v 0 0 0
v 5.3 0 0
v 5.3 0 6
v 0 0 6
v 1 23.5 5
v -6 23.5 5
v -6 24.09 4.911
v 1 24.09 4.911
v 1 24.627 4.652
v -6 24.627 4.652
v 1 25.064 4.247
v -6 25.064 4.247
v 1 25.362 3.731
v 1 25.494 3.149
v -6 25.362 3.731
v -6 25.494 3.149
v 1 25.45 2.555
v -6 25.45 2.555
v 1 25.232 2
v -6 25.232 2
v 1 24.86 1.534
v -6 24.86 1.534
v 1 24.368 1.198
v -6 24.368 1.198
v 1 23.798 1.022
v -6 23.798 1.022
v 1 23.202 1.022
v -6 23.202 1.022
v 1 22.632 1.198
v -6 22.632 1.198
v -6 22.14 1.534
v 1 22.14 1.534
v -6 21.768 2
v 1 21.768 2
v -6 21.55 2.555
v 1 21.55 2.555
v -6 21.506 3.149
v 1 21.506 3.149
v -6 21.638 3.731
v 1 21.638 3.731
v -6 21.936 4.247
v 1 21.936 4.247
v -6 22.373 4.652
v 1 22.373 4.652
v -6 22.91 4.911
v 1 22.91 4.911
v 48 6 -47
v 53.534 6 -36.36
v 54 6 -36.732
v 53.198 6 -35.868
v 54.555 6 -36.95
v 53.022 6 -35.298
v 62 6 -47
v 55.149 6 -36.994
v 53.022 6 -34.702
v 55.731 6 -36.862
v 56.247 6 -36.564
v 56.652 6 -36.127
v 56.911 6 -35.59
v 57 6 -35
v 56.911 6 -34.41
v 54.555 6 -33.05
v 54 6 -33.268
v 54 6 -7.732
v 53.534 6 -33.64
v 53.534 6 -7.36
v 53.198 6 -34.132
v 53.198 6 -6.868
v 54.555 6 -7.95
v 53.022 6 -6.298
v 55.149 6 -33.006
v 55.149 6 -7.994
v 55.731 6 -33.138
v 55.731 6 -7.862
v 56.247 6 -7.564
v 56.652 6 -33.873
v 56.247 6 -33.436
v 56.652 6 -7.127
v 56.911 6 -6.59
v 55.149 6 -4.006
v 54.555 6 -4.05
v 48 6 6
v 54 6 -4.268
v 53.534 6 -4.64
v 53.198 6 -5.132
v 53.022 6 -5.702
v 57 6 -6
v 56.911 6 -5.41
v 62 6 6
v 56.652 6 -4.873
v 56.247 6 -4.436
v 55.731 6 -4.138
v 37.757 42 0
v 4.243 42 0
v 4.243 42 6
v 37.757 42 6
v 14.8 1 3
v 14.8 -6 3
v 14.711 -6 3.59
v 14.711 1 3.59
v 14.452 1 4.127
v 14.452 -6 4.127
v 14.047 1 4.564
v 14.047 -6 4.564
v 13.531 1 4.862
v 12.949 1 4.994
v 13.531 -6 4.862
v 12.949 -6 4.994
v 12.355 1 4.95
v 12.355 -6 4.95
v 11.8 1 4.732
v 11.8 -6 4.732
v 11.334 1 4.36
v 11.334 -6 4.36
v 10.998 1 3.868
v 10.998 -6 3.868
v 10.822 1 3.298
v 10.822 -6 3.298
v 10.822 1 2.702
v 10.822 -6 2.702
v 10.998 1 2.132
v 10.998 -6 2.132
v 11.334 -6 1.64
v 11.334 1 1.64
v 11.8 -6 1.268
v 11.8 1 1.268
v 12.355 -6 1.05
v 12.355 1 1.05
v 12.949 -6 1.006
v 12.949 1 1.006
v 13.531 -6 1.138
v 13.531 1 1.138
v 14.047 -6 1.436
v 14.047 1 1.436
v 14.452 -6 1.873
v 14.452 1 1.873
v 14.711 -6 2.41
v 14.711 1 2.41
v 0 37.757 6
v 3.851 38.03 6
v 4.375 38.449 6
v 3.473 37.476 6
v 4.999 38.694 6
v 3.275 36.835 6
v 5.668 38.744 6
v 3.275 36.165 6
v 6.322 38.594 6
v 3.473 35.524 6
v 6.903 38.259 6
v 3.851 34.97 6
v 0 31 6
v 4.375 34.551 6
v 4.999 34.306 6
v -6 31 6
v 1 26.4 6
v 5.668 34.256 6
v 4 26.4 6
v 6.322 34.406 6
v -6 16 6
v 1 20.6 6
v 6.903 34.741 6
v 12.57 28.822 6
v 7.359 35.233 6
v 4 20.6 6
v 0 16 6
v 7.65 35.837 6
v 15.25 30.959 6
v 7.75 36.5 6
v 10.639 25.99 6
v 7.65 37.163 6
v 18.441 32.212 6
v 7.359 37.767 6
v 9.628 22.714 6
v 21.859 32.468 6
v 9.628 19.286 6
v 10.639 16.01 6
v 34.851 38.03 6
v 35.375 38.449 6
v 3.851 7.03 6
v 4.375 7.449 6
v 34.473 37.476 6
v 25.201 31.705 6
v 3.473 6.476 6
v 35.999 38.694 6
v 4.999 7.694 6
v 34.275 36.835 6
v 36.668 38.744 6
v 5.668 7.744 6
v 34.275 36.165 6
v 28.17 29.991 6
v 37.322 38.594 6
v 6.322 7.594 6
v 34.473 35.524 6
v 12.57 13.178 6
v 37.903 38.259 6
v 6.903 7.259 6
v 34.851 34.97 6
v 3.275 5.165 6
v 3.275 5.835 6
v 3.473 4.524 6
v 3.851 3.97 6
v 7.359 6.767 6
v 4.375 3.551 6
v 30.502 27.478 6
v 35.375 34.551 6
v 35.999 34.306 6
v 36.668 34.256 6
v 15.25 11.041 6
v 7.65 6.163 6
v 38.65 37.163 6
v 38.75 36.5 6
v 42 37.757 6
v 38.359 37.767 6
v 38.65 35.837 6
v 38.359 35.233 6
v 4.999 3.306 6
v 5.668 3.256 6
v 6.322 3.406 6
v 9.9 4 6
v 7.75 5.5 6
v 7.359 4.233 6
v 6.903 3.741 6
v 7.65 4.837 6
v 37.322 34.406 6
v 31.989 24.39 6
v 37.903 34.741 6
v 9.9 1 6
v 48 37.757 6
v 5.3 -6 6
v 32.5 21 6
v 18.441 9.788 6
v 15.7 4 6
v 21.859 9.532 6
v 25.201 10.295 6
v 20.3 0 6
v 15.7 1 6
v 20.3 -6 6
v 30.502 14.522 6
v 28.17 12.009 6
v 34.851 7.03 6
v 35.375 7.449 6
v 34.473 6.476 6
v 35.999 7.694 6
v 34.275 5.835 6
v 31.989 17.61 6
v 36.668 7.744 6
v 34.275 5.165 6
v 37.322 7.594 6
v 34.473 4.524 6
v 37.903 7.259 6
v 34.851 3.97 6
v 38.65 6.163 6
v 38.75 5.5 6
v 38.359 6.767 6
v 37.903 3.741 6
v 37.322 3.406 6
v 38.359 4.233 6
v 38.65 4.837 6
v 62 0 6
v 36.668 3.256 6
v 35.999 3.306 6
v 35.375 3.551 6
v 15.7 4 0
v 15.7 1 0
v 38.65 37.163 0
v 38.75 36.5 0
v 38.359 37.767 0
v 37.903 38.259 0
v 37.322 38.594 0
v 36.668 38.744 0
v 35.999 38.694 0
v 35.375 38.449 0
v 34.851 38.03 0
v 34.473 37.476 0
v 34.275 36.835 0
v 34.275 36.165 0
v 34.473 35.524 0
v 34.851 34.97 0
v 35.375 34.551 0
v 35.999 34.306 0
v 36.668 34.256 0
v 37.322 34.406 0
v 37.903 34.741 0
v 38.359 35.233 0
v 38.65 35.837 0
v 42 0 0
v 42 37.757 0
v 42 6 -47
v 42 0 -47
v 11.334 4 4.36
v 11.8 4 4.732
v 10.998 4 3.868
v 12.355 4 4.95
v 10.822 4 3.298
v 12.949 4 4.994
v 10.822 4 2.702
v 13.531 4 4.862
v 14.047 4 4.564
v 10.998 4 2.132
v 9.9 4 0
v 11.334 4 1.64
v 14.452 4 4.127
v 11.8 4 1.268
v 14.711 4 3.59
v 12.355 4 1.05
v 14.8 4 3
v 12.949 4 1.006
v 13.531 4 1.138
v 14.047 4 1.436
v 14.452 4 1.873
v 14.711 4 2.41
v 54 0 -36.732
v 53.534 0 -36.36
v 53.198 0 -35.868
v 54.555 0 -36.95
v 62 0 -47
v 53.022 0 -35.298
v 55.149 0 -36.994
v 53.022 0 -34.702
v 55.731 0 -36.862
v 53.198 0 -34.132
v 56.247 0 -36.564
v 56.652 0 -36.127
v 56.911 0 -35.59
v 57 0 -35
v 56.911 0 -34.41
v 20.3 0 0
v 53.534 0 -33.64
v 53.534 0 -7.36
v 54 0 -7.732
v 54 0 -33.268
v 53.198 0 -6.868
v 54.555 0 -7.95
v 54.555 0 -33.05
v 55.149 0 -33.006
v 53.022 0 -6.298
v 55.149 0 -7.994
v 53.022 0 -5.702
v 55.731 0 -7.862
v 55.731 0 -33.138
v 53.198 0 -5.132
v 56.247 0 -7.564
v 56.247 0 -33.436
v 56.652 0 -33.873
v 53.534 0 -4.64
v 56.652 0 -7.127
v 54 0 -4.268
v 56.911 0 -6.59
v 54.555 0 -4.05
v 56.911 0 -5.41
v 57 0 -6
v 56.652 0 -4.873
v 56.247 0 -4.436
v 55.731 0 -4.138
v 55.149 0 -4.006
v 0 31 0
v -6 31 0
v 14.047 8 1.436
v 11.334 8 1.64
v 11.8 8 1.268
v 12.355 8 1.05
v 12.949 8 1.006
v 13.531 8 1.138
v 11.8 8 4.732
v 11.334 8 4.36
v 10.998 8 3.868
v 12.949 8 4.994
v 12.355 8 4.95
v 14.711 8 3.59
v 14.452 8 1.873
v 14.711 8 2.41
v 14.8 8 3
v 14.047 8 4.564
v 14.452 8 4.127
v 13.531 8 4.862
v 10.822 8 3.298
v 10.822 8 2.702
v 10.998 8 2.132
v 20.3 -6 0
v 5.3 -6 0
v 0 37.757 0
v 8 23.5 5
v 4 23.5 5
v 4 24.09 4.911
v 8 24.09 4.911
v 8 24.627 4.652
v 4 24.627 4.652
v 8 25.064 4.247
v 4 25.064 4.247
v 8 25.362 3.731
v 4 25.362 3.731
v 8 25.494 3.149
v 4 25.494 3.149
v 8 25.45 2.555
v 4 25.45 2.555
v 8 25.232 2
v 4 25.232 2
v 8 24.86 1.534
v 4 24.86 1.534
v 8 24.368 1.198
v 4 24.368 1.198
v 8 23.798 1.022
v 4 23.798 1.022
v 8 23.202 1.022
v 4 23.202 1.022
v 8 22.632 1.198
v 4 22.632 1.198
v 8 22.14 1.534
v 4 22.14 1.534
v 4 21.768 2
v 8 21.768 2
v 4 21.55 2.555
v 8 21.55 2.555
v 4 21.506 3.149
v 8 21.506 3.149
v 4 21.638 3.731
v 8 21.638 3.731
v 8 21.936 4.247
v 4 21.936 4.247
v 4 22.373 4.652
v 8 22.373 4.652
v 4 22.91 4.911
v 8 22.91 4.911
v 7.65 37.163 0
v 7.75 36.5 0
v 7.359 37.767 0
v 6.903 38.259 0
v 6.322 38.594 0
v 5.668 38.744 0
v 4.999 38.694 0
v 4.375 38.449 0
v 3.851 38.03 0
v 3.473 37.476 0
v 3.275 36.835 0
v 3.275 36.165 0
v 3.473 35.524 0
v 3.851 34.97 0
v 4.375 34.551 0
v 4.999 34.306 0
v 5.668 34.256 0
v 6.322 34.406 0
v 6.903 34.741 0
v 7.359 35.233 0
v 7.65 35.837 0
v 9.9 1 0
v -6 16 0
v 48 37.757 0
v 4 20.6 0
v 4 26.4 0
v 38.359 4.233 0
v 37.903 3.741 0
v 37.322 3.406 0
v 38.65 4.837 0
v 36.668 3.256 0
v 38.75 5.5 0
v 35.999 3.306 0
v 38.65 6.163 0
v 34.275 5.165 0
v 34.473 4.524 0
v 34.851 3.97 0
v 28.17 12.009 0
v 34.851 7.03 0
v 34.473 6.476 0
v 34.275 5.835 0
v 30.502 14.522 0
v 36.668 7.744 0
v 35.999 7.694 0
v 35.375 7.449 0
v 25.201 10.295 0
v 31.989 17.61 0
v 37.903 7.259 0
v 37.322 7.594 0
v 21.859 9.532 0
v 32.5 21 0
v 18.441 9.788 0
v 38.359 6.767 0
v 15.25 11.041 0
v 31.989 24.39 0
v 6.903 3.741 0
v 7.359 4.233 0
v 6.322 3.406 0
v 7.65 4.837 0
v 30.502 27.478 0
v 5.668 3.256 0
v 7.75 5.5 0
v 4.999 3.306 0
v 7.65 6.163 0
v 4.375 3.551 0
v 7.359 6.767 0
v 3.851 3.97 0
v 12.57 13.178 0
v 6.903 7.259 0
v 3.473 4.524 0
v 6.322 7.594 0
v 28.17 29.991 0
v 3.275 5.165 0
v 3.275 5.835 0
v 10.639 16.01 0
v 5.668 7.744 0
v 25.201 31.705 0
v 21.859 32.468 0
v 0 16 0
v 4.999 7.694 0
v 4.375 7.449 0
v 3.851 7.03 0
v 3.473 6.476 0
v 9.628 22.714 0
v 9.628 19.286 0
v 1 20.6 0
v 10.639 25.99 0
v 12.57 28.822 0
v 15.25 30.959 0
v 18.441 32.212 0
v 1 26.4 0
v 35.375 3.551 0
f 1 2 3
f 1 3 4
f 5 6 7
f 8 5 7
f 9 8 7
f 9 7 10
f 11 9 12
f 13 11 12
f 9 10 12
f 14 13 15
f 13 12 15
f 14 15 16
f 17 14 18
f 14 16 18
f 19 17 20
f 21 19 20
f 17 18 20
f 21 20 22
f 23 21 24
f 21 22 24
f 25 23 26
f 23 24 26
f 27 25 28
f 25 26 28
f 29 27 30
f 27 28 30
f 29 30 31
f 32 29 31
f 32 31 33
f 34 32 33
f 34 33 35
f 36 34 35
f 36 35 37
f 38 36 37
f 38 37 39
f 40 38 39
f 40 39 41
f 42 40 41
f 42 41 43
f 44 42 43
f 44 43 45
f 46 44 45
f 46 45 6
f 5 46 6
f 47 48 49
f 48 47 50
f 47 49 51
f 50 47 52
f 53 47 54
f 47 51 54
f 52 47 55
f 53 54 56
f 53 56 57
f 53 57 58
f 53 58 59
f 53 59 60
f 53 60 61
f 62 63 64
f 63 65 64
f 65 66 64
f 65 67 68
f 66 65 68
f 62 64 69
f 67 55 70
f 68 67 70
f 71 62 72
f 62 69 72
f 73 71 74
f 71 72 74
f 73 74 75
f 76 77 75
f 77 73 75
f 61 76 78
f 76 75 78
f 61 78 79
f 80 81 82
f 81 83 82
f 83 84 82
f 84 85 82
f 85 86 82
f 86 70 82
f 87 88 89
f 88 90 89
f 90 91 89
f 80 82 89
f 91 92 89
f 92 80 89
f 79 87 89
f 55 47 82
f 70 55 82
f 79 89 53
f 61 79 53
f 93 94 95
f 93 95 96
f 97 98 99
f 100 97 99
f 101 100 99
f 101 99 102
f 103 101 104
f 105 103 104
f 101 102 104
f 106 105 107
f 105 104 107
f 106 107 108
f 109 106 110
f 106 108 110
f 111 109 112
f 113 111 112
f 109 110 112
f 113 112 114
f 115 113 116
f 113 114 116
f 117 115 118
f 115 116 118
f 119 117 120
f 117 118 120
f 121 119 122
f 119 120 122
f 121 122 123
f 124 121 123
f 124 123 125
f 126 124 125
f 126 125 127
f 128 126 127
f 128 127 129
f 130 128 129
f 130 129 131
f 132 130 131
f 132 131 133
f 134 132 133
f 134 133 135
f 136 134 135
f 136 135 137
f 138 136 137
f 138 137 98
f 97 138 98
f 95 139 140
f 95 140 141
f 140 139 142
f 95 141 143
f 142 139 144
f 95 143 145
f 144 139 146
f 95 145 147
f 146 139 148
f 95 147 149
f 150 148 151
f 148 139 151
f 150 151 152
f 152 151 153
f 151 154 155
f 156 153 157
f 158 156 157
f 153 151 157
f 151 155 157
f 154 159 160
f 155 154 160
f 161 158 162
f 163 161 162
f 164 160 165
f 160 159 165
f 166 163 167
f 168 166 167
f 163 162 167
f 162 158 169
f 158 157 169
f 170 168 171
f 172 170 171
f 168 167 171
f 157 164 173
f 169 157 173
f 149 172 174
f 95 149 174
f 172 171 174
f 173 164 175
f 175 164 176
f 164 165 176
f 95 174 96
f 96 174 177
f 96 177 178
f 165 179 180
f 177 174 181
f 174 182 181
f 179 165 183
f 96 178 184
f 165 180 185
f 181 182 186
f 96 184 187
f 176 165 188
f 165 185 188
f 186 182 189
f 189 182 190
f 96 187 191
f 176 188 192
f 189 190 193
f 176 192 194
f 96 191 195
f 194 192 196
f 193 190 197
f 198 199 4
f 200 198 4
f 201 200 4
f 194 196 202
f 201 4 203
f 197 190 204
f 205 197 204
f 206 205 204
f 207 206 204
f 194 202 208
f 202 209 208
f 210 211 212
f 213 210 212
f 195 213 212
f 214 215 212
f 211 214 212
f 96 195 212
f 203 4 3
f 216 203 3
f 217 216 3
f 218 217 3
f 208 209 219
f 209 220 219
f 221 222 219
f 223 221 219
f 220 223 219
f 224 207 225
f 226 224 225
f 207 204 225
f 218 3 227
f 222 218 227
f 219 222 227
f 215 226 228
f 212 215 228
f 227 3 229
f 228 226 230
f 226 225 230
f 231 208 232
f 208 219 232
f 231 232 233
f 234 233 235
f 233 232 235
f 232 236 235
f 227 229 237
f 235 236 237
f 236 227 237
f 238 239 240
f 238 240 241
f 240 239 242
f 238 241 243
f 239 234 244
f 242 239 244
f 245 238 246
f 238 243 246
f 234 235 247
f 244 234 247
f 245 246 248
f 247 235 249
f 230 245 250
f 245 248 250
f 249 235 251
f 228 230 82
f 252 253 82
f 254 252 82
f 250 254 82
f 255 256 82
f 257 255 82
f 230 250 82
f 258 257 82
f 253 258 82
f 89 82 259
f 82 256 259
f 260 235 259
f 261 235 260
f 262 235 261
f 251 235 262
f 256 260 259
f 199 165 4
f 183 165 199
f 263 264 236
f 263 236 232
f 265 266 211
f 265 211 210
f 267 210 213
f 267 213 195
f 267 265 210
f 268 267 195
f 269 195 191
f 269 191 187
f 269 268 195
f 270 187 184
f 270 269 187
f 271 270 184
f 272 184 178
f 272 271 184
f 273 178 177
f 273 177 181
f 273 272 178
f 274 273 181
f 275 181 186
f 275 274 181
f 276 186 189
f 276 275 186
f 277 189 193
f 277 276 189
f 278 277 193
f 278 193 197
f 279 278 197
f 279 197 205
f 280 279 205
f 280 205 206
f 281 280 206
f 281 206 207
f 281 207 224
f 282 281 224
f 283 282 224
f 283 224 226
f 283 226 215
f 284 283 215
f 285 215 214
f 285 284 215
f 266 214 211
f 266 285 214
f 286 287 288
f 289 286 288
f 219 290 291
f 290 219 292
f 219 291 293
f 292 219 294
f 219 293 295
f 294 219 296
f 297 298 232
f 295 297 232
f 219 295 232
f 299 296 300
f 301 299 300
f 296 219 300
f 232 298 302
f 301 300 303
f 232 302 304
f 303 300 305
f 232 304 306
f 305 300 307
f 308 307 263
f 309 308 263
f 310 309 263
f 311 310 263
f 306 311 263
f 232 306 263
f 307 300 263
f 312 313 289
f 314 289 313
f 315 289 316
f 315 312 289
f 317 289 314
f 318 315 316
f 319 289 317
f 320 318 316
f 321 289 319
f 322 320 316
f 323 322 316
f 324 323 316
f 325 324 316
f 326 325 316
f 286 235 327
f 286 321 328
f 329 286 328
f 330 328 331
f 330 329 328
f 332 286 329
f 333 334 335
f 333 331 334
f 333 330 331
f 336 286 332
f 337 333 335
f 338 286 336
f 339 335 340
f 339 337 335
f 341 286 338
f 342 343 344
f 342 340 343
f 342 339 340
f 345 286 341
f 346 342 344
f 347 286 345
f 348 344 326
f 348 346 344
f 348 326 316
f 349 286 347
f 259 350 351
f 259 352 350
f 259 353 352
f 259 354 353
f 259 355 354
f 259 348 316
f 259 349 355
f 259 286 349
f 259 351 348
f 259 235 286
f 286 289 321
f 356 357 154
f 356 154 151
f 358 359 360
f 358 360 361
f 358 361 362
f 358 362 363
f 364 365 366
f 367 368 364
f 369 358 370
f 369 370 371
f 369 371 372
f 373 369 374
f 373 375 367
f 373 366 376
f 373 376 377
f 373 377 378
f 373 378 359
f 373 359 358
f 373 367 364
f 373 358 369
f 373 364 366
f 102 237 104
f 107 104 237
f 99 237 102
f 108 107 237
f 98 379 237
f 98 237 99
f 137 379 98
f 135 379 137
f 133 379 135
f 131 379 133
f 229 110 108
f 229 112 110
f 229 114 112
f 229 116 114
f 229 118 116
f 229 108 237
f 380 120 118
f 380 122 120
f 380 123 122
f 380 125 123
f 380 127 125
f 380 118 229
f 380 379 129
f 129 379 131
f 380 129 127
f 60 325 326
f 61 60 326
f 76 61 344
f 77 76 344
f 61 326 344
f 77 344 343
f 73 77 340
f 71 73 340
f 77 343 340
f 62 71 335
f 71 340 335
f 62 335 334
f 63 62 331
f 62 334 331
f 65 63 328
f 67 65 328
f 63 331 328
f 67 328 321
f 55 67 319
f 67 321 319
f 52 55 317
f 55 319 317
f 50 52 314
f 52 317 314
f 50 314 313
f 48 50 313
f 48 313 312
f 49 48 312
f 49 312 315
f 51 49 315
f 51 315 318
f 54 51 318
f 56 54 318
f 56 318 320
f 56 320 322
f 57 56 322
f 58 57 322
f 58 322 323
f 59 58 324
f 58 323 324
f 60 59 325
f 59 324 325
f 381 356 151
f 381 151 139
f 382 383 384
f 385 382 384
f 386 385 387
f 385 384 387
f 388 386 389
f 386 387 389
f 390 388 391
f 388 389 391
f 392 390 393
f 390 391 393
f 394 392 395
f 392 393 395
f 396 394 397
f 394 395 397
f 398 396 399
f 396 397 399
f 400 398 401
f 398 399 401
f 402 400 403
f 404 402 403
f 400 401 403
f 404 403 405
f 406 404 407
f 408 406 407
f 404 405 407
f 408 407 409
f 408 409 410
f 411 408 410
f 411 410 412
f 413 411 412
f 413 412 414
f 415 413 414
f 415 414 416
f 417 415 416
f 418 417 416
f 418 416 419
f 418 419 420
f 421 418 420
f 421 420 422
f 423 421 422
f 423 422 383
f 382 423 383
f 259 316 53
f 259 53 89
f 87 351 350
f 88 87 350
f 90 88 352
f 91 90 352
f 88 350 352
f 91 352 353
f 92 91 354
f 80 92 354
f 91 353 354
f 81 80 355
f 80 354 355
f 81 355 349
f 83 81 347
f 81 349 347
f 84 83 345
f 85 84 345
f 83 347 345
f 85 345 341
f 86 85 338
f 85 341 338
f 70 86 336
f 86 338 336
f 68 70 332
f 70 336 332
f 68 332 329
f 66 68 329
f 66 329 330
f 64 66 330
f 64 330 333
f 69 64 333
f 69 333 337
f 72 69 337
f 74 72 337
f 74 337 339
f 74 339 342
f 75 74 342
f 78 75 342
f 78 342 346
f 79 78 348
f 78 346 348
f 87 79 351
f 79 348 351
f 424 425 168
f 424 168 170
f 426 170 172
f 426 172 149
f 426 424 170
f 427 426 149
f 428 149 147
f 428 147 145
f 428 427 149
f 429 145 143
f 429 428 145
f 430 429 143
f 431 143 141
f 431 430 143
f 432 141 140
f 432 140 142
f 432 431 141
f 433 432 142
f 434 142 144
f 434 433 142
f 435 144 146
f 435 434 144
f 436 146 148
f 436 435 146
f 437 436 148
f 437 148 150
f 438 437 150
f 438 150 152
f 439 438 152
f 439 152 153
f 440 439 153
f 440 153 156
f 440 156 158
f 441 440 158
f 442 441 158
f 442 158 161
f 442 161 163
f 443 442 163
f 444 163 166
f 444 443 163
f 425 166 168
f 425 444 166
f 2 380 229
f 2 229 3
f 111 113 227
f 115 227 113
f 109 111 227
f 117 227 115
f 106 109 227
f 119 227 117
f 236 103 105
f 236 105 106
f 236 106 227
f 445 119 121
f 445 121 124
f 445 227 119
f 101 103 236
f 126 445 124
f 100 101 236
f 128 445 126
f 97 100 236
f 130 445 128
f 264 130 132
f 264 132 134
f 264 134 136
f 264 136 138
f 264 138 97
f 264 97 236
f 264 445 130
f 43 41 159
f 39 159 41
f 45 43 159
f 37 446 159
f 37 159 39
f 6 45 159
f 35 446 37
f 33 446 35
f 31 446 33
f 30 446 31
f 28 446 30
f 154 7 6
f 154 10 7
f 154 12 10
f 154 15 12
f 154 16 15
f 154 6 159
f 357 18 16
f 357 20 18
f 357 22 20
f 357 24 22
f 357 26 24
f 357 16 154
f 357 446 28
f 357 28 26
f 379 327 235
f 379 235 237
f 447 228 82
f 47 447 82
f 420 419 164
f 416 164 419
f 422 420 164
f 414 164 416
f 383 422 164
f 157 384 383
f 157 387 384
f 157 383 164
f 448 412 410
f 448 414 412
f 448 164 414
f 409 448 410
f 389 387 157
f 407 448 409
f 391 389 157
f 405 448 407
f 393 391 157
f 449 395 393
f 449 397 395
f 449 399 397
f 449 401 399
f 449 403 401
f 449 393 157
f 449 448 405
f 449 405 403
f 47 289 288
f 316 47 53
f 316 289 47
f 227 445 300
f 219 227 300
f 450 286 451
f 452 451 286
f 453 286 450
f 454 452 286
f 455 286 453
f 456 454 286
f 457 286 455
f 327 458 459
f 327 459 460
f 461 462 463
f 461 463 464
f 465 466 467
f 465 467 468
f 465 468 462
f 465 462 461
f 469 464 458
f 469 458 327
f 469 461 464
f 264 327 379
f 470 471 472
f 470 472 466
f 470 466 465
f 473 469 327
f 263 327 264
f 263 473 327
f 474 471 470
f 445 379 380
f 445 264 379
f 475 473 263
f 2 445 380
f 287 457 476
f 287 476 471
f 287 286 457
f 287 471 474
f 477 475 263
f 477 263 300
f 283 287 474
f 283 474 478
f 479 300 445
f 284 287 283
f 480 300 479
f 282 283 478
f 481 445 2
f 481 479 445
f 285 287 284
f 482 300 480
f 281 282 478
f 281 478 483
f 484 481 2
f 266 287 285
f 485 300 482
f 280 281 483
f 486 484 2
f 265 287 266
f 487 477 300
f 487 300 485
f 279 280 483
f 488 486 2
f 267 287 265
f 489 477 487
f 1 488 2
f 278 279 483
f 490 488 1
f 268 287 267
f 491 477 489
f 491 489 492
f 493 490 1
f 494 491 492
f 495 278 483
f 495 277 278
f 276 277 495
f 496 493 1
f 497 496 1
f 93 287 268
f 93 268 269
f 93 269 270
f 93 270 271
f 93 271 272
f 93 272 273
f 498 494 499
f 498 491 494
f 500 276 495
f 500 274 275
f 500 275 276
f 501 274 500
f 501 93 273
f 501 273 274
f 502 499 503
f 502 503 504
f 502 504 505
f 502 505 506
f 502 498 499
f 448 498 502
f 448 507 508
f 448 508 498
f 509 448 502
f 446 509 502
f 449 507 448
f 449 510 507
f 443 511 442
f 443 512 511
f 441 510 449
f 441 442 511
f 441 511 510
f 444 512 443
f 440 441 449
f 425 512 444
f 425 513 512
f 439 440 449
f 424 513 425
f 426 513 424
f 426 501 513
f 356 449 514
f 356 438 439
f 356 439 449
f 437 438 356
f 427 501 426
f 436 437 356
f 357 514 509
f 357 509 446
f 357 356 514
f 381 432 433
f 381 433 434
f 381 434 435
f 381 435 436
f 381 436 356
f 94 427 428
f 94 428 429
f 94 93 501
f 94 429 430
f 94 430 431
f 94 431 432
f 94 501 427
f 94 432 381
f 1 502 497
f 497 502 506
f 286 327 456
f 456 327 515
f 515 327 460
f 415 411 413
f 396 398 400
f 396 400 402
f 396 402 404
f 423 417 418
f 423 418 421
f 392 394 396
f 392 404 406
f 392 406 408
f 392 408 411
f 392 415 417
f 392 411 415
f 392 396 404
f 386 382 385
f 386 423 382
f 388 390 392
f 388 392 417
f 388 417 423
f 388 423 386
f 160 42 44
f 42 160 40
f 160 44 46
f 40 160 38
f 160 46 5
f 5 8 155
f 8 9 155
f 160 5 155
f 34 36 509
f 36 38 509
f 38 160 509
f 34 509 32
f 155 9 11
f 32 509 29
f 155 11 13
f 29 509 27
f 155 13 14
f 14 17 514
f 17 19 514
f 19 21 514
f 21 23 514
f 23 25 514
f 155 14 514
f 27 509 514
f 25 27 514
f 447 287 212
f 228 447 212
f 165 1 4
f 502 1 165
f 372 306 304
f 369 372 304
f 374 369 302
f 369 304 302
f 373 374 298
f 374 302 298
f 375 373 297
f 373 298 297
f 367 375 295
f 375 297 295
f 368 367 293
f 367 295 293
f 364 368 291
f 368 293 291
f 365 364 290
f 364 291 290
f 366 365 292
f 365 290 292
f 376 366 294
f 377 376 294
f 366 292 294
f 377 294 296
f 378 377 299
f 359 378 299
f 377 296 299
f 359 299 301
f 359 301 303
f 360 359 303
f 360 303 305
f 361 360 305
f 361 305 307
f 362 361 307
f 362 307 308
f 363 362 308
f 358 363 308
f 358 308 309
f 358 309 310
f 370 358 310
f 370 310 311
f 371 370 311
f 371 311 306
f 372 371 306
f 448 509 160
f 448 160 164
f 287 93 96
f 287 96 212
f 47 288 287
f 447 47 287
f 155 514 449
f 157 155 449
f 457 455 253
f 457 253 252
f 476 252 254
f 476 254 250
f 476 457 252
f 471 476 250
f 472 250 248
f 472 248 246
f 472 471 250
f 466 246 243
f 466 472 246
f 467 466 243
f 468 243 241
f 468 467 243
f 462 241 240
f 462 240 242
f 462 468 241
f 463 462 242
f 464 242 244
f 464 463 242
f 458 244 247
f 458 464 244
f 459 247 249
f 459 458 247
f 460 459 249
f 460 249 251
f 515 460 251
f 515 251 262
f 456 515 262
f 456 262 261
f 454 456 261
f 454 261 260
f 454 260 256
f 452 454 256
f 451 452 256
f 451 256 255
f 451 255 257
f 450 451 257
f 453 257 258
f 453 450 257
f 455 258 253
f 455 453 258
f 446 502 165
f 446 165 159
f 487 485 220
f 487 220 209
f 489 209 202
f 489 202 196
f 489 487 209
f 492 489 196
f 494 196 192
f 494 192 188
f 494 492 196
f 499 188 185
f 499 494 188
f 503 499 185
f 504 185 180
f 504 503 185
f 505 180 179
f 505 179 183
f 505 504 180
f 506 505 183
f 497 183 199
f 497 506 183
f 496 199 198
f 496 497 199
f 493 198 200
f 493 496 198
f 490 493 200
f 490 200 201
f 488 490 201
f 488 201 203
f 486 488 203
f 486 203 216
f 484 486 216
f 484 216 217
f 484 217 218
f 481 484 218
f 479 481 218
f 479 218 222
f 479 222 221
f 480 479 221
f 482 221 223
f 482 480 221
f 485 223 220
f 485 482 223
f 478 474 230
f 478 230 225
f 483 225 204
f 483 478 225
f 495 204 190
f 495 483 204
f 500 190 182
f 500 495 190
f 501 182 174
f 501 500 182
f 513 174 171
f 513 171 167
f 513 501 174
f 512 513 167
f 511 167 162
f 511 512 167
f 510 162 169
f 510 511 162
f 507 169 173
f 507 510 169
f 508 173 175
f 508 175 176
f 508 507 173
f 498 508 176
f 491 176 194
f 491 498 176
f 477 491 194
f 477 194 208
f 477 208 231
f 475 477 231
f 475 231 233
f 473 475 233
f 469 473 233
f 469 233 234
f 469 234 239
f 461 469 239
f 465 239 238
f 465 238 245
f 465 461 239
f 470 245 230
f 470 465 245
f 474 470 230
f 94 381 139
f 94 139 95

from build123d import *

# Parameters (mm, degrees)
ESQUISSE1_R             = 11.5
ESQUISSE1_R_2           = 2.25
ESQUISSE1_W             = 3
ESQUISSE1_H             = 5.8
ESQUISSE1_W_2           = 5.8
ESQUISSE1_H_2           = 3
BOSS_EXTRU_2_DEPTH      = 6
BOSS_EXTRU_4_DEPTH      = 6
ESQUISSE11_W            = 14
ESQUISSE11_H            = 53
ESQUISSE11_R            = 2
BOSS_EXTRU_5_DEPTH      = 6
ESQUISSE13_R            = 2
ENL_V_MAT_EXTRU_1_DEPTH = 14
ESQUISSE14_R            = 2
ENL_V_MAT_EXTRU_2_DEPTH = 14


with BuildPart() as part:
    # Esquisse1 → Boss.-Extru.2 (new body)
    with BuildSketch(Plane.XY):
        Polygon((0, 0), (0, 16), (-6, 16), (-6, 31), (0, 31), (0, 37.757359313), (4.242640687, 42), (37.757359313, 42), (42, 37.757359313), (42, 0), (20.3, 0), (20.3, -6), (5.3, -6), (5.3, 0), align=None)
        with Locations((21, 21)):
            Circle(ESQUISSE1_R, mode=Mode.SUBTRACT)
        with Locations((5.5, 36.5)):
            Circle(ESQUISSE1_R_2, mode=Mode.SUBTRACT)
        with Locations((36.5, 36.5)):
            Circle(ESQUISSE1_R_2, mode=Mode.SUBTRACT)
        with Locations((5.5, 5.5)):
            Circle(ESQUISSE1_R_2, mode=Mode.SUBTRACT)
        with Locations((36.5, 5.5)):
            Circle(ESQUISSE1_R_2, mode=Mode.SUBTRACT)
        with Locations((2.5, 23.5)):
            Rectangle(ESQUISSE1_W, ESQUISSE1_H, mode=Mode.SUBTRACT)
        with Locations((12.8, 2.5)):
            Rectangle(ESQUISSE1_W_2, ESQUISSE1_H_2, mode=Mode.SUBTRACT)
    extrude(amount=BOSS_EXTRU_2_DEPTH)

    # Esquisse9 → Boss.-Extru.4 (add)
    with BuildSketch(Plane(origin=(42, 0, 0), x_dir=(0, 0, -1), z_dir=(1, 0, 0))):
        Polygon((-6, 0), (47, 0), (47, 6), (0, 37.757359313), (-6, 37.757359313), align=None)
    extrude(amount=BOSS_EXTRU_4_DEPTH)

    # Esquisse11 → Boss.-Extru.5 (add)
    with BuildSketch(Plane.XZ):
        with Locations((55, -20.5)):
            Rectangle(ESQUISSE11_W, ESQUISSE11_H)
        with Locations((55, -35)):
            Circle(ESQUISSE11_R, mode=Mode.SUBTRACT)
        with Locations((55, -6)):
            Circle(ESQUISSE11_R, mode=Mode.SUBTRACT)
    extrude(amount=-BOSS_EXTRU_5_DEPTH)

    # Esquisse13 → Enlèv. mat.-Extru.1 (cut)
    with BuildSketch(Plane.ZY.offset(6)):
        with Locations((3, 23.5)):
            Circle(ESQUISSE13_R)
    extrude(amount=-ENL_V_MAT_EXTRU_1_DEPTH, mode=Mode.SUBTRACT)

    # Esquisse14 → Enlèv. mat.-Extru.2 (cut)
    with BuildSketch(Plane.XZ.offset(6)):
        with Locations((12.8, 3)):
            Circle(ESQUISSE14_R)
    extrude(amount=-ENL_V_MAT_EXTRU_2_DEPTH, mode=Mode.SUBTRACT)


solid = part.part
